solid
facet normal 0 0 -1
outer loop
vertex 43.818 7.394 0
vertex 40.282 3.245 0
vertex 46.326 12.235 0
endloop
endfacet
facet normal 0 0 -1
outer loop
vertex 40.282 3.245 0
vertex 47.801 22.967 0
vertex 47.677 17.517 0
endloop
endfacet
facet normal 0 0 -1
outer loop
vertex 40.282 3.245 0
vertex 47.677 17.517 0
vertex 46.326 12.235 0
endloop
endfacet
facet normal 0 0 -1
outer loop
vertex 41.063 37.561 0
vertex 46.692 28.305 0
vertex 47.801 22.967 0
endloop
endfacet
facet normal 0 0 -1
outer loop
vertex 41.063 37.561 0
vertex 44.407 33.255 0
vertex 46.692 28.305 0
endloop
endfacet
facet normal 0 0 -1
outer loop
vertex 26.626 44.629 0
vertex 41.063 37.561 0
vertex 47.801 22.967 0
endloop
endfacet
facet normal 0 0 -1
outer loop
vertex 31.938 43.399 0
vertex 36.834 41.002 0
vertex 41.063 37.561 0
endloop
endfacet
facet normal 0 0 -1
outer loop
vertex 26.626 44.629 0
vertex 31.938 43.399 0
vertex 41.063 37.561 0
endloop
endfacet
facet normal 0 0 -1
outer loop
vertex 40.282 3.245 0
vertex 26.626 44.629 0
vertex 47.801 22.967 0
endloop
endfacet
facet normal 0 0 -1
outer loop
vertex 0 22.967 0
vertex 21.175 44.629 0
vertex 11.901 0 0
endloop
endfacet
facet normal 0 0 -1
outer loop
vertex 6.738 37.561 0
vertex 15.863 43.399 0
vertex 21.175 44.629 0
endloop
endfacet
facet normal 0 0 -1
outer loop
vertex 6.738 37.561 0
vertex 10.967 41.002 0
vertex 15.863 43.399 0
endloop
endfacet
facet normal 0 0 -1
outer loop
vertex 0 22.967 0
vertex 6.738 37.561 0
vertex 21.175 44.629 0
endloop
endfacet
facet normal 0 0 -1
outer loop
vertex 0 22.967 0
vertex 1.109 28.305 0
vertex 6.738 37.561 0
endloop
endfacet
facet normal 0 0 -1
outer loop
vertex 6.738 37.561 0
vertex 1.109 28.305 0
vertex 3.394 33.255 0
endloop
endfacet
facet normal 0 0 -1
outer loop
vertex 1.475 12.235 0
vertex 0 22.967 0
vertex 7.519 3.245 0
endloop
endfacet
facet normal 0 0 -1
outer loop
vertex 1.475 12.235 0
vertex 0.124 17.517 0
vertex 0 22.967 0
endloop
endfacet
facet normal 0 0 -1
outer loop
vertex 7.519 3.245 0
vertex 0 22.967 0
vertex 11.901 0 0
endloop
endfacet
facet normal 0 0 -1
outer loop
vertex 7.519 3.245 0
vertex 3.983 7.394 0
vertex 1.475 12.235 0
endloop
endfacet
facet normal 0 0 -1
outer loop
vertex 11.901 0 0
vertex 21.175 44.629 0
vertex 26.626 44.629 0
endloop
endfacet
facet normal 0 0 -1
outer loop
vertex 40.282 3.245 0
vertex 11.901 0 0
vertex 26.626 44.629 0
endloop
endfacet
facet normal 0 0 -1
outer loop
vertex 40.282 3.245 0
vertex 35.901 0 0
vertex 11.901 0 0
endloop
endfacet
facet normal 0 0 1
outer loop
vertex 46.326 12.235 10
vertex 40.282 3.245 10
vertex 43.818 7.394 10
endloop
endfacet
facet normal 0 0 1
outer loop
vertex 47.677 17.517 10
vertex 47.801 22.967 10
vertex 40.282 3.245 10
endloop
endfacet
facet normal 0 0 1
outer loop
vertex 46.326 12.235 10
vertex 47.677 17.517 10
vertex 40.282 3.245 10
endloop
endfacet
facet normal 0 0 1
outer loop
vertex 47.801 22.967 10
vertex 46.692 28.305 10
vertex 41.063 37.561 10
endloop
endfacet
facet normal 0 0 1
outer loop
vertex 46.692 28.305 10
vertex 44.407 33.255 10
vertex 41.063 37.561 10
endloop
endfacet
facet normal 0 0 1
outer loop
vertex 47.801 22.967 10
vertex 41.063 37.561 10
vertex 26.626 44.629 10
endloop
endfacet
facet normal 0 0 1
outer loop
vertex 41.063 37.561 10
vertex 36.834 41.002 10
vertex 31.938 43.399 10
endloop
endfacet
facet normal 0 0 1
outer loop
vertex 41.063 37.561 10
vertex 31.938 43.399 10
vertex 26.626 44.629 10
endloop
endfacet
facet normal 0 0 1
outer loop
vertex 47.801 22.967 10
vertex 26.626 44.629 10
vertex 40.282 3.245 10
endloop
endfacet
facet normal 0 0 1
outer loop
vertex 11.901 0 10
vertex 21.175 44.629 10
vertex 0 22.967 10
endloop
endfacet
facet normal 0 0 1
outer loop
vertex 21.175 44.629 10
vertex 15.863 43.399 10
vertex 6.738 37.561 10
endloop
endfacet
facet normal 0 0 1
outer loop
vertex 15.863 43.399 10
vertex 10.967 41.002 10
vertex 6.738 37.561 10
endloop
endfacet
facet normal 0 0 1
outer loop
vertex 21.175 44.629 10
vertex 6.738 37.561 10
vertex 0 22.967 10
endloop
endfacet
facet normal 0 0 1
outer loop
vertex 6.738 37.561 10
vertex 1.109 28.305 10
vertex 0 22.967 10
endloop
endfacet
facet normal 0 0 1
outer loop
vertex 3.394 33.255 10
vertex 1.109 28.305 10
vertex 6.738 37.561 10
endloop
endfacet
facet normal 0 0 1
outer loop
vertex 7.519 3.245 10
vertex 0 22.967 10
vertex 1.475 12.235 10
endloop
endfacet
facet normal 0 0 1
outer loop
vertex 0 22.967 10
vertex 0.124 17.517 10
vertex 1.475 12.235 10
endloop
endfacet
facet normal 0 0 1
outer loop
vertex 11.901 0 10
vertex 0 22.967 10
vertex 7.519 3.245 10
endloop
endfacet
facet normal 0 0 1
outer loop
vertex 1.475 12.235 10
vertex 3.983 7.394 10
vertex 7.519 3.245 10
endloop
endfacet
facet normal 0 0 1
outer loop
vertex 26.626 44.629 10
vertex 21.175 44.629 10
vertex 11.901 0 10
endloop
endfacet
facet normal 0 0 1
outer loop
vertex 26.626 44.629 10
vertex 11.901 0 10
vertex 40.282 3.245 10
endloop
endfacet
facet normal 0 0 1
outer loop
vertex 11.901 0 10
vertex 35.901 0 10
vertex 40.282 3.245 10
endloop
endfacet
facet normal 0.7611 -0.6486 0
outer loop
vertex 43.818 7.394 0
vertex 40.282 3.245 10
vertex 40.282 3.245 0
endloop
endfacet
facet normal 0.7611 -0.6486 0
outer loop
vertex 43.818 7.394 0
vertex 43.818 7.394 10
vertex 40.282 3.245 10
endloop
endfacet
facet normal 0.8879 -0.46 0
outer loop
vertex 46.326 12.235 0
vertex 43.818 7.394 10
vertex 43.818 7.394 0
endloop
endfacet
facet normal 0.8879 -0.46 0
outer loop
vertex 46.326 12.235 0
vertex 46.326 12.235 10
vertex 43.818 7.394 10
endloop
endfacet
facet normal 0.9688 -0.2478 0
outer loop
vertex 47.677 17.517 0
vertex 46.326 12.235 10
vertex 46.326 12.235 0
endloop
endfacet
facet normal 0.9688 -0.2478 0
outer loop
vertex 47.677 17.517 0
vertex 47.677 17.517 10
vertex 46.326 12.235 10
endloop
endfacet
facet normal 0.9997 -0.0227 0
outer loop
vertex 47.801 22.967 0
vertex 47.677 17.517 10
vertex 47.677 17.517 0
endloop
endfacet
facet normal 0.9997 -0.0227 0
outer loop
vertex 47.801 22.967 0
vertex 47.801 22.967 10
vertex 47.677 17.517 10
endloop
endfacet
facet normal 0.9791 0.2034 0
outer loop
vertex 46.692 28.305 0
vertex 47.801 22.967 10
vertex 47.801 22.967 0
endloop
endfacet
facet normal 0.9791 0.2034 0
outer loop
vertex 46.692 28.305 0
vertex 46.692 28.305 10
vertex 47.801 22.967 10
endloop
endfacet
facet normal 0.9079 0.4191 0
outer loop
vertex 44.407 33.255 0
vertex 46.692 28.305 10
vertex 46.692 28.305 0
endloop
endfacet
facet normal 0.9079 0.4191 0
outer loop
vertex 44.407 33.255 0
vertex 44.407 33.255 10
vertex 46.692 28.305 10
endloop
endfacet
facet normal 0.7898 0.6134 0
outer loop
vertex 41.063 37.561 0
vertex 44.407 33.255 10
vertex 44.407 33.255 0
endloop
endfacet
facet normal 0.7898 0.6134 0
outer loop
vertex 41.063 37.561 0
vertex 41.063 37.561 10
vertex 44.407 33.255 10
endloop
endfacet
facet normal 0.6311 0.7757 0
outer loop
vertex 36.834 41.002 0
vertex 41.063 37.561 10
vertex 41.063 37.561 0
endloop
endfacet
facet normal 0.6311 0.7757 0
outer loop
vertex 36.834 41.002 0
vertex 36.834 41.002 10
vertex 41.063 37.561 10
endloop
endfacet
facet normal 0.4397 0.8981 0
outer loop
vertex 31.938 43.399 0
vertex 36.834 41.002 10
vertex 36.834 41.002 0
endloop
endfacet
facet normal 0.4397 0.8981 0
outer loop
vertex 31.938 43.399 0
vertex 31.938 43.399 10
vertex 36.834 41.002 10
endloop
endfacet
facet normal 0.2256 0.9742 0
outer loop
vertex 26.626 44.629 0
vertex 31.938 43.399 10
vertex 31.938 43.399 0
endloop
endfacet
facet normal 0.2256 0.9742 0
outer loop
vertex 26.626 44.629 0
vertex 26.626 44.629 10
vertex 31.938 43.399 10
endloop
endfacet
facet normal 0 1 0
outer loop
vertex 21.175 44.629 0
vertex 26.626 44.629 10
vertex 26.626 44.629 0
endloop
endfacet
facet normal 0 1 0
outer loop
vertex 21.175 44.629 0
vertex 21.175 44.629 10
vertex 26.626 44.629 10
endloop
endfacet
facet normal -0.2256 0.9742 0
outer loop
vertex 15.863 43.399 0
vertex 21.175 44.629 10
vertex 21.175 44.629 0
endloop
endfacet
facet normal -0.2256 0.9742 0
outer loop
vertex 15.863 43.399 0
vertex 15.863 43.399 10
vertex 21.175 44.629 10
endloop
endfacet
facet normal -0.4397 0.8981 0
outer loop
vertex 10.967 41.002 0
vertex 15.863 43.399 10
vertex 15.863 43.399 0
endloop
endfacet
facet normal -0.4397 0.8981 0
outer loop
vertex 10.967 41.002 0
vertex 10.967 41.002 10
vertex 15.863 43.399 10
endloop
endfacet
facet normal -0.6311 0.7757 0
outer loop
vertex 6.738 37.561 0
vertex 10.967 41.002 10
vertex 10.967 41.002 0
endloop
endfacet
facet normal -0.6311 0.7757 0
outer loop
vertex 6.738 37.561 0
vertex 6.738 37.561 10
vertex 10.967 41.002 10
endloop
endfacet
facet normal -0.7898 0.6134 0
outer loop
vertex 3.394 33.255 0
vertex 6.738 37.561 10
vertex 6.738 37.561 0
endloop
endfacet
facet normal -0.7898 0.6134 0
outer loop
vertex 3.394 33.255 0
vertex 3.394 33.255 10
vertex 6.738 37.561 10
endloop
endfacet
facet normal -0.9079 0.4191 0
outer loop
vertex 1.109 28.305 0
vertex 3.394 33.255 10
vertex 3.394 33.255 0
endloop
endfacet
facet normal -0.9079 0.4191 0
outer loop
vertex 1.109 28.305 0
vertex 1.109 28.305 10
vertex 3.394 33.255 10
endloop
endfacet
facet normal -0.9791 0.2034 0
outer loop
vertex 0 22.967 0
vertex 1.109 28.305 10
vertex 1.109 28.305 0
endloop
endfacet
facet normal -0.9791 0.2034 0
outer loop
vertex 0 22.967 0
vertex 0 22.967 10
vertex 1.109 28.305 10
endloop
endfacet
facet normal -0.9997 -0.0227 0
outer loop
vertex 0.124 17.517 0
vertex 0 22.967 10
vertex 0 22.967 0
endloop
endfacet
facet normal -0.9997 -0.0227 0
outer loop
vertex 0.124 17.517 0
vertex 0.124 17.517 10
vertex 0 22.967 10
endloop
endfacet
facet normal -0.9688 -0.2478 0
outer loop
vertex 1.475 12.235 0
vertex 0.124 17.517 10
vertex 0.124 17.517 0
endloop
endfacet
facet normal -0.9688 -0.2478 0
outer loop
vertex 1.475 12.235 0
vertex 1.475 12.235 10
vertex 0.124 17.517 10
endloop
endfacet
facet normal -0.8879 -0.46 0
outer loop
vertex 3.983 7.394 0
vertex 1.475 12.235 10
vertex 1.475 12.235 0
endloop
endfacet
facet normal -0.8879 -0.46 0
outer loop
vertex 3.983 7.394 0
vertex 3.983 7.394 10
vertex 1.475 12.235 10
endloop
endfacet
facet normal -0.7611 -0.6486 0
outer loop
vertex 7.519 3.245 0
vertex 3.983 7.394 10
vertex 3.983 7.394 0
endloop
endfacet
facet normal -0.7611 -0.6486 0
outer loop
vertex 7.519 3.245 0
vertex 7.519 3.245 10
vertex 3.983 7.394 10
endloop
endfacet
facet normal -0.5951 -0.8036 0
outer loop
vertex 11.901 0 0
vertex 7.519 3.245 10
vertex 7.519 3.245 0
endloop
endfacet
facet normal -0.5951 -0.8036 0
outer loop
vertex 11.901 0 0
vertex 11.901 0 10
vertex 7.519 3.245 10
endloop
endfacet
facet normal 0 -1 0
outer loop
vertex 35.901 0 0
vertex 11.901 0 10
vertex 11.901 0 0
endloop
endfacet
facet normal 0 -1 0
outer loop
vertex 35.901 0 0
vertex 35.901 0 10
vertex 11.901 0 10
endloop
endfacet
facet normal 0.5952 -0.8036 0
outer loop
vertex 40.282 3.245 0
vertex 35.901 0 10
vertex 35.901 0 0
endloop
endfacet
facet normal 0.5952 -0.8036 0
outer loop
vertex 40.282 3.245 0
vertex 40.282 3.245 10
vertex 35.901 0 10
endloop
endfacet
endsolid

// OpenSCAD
$fn = 32;

// ----------------------------------------------------------------------
// Flat adaptor: single_d, 10 mm thick
// ----------------------------------------------------------------------

// --- parameters (mm) ---
profile_height = 10;      // extrusion height
profile_points = 24;      // points of the closed outline

profile = [[35.901, 0], [40.282, 3.245], [43.818, 7.394], [46.326, 12.235], [47.677, 17.517], [47.801, 22.967], [46.692, 28.305], [44.407, 33.255], [41.063, 37.561], [36.834, 41.002], [31.938, 43.399], [26.626, 44.629], [21.175, 44.629], [15.863, 43.399], [10.967, 41.002], [6.738, 37.561], [3.394, 33.255], [1.109, 28.305], [0, 22.967], [0.124, 17.517], [1.475, 12.235], [3.983, 7.394], [7.519, 3.245], [11.901, 0]];  // single closed polygon, 24 points, counter clockwise

// --- the one profile operation ---
linear_extrude(height = profile_height) polygon(points = profile);
